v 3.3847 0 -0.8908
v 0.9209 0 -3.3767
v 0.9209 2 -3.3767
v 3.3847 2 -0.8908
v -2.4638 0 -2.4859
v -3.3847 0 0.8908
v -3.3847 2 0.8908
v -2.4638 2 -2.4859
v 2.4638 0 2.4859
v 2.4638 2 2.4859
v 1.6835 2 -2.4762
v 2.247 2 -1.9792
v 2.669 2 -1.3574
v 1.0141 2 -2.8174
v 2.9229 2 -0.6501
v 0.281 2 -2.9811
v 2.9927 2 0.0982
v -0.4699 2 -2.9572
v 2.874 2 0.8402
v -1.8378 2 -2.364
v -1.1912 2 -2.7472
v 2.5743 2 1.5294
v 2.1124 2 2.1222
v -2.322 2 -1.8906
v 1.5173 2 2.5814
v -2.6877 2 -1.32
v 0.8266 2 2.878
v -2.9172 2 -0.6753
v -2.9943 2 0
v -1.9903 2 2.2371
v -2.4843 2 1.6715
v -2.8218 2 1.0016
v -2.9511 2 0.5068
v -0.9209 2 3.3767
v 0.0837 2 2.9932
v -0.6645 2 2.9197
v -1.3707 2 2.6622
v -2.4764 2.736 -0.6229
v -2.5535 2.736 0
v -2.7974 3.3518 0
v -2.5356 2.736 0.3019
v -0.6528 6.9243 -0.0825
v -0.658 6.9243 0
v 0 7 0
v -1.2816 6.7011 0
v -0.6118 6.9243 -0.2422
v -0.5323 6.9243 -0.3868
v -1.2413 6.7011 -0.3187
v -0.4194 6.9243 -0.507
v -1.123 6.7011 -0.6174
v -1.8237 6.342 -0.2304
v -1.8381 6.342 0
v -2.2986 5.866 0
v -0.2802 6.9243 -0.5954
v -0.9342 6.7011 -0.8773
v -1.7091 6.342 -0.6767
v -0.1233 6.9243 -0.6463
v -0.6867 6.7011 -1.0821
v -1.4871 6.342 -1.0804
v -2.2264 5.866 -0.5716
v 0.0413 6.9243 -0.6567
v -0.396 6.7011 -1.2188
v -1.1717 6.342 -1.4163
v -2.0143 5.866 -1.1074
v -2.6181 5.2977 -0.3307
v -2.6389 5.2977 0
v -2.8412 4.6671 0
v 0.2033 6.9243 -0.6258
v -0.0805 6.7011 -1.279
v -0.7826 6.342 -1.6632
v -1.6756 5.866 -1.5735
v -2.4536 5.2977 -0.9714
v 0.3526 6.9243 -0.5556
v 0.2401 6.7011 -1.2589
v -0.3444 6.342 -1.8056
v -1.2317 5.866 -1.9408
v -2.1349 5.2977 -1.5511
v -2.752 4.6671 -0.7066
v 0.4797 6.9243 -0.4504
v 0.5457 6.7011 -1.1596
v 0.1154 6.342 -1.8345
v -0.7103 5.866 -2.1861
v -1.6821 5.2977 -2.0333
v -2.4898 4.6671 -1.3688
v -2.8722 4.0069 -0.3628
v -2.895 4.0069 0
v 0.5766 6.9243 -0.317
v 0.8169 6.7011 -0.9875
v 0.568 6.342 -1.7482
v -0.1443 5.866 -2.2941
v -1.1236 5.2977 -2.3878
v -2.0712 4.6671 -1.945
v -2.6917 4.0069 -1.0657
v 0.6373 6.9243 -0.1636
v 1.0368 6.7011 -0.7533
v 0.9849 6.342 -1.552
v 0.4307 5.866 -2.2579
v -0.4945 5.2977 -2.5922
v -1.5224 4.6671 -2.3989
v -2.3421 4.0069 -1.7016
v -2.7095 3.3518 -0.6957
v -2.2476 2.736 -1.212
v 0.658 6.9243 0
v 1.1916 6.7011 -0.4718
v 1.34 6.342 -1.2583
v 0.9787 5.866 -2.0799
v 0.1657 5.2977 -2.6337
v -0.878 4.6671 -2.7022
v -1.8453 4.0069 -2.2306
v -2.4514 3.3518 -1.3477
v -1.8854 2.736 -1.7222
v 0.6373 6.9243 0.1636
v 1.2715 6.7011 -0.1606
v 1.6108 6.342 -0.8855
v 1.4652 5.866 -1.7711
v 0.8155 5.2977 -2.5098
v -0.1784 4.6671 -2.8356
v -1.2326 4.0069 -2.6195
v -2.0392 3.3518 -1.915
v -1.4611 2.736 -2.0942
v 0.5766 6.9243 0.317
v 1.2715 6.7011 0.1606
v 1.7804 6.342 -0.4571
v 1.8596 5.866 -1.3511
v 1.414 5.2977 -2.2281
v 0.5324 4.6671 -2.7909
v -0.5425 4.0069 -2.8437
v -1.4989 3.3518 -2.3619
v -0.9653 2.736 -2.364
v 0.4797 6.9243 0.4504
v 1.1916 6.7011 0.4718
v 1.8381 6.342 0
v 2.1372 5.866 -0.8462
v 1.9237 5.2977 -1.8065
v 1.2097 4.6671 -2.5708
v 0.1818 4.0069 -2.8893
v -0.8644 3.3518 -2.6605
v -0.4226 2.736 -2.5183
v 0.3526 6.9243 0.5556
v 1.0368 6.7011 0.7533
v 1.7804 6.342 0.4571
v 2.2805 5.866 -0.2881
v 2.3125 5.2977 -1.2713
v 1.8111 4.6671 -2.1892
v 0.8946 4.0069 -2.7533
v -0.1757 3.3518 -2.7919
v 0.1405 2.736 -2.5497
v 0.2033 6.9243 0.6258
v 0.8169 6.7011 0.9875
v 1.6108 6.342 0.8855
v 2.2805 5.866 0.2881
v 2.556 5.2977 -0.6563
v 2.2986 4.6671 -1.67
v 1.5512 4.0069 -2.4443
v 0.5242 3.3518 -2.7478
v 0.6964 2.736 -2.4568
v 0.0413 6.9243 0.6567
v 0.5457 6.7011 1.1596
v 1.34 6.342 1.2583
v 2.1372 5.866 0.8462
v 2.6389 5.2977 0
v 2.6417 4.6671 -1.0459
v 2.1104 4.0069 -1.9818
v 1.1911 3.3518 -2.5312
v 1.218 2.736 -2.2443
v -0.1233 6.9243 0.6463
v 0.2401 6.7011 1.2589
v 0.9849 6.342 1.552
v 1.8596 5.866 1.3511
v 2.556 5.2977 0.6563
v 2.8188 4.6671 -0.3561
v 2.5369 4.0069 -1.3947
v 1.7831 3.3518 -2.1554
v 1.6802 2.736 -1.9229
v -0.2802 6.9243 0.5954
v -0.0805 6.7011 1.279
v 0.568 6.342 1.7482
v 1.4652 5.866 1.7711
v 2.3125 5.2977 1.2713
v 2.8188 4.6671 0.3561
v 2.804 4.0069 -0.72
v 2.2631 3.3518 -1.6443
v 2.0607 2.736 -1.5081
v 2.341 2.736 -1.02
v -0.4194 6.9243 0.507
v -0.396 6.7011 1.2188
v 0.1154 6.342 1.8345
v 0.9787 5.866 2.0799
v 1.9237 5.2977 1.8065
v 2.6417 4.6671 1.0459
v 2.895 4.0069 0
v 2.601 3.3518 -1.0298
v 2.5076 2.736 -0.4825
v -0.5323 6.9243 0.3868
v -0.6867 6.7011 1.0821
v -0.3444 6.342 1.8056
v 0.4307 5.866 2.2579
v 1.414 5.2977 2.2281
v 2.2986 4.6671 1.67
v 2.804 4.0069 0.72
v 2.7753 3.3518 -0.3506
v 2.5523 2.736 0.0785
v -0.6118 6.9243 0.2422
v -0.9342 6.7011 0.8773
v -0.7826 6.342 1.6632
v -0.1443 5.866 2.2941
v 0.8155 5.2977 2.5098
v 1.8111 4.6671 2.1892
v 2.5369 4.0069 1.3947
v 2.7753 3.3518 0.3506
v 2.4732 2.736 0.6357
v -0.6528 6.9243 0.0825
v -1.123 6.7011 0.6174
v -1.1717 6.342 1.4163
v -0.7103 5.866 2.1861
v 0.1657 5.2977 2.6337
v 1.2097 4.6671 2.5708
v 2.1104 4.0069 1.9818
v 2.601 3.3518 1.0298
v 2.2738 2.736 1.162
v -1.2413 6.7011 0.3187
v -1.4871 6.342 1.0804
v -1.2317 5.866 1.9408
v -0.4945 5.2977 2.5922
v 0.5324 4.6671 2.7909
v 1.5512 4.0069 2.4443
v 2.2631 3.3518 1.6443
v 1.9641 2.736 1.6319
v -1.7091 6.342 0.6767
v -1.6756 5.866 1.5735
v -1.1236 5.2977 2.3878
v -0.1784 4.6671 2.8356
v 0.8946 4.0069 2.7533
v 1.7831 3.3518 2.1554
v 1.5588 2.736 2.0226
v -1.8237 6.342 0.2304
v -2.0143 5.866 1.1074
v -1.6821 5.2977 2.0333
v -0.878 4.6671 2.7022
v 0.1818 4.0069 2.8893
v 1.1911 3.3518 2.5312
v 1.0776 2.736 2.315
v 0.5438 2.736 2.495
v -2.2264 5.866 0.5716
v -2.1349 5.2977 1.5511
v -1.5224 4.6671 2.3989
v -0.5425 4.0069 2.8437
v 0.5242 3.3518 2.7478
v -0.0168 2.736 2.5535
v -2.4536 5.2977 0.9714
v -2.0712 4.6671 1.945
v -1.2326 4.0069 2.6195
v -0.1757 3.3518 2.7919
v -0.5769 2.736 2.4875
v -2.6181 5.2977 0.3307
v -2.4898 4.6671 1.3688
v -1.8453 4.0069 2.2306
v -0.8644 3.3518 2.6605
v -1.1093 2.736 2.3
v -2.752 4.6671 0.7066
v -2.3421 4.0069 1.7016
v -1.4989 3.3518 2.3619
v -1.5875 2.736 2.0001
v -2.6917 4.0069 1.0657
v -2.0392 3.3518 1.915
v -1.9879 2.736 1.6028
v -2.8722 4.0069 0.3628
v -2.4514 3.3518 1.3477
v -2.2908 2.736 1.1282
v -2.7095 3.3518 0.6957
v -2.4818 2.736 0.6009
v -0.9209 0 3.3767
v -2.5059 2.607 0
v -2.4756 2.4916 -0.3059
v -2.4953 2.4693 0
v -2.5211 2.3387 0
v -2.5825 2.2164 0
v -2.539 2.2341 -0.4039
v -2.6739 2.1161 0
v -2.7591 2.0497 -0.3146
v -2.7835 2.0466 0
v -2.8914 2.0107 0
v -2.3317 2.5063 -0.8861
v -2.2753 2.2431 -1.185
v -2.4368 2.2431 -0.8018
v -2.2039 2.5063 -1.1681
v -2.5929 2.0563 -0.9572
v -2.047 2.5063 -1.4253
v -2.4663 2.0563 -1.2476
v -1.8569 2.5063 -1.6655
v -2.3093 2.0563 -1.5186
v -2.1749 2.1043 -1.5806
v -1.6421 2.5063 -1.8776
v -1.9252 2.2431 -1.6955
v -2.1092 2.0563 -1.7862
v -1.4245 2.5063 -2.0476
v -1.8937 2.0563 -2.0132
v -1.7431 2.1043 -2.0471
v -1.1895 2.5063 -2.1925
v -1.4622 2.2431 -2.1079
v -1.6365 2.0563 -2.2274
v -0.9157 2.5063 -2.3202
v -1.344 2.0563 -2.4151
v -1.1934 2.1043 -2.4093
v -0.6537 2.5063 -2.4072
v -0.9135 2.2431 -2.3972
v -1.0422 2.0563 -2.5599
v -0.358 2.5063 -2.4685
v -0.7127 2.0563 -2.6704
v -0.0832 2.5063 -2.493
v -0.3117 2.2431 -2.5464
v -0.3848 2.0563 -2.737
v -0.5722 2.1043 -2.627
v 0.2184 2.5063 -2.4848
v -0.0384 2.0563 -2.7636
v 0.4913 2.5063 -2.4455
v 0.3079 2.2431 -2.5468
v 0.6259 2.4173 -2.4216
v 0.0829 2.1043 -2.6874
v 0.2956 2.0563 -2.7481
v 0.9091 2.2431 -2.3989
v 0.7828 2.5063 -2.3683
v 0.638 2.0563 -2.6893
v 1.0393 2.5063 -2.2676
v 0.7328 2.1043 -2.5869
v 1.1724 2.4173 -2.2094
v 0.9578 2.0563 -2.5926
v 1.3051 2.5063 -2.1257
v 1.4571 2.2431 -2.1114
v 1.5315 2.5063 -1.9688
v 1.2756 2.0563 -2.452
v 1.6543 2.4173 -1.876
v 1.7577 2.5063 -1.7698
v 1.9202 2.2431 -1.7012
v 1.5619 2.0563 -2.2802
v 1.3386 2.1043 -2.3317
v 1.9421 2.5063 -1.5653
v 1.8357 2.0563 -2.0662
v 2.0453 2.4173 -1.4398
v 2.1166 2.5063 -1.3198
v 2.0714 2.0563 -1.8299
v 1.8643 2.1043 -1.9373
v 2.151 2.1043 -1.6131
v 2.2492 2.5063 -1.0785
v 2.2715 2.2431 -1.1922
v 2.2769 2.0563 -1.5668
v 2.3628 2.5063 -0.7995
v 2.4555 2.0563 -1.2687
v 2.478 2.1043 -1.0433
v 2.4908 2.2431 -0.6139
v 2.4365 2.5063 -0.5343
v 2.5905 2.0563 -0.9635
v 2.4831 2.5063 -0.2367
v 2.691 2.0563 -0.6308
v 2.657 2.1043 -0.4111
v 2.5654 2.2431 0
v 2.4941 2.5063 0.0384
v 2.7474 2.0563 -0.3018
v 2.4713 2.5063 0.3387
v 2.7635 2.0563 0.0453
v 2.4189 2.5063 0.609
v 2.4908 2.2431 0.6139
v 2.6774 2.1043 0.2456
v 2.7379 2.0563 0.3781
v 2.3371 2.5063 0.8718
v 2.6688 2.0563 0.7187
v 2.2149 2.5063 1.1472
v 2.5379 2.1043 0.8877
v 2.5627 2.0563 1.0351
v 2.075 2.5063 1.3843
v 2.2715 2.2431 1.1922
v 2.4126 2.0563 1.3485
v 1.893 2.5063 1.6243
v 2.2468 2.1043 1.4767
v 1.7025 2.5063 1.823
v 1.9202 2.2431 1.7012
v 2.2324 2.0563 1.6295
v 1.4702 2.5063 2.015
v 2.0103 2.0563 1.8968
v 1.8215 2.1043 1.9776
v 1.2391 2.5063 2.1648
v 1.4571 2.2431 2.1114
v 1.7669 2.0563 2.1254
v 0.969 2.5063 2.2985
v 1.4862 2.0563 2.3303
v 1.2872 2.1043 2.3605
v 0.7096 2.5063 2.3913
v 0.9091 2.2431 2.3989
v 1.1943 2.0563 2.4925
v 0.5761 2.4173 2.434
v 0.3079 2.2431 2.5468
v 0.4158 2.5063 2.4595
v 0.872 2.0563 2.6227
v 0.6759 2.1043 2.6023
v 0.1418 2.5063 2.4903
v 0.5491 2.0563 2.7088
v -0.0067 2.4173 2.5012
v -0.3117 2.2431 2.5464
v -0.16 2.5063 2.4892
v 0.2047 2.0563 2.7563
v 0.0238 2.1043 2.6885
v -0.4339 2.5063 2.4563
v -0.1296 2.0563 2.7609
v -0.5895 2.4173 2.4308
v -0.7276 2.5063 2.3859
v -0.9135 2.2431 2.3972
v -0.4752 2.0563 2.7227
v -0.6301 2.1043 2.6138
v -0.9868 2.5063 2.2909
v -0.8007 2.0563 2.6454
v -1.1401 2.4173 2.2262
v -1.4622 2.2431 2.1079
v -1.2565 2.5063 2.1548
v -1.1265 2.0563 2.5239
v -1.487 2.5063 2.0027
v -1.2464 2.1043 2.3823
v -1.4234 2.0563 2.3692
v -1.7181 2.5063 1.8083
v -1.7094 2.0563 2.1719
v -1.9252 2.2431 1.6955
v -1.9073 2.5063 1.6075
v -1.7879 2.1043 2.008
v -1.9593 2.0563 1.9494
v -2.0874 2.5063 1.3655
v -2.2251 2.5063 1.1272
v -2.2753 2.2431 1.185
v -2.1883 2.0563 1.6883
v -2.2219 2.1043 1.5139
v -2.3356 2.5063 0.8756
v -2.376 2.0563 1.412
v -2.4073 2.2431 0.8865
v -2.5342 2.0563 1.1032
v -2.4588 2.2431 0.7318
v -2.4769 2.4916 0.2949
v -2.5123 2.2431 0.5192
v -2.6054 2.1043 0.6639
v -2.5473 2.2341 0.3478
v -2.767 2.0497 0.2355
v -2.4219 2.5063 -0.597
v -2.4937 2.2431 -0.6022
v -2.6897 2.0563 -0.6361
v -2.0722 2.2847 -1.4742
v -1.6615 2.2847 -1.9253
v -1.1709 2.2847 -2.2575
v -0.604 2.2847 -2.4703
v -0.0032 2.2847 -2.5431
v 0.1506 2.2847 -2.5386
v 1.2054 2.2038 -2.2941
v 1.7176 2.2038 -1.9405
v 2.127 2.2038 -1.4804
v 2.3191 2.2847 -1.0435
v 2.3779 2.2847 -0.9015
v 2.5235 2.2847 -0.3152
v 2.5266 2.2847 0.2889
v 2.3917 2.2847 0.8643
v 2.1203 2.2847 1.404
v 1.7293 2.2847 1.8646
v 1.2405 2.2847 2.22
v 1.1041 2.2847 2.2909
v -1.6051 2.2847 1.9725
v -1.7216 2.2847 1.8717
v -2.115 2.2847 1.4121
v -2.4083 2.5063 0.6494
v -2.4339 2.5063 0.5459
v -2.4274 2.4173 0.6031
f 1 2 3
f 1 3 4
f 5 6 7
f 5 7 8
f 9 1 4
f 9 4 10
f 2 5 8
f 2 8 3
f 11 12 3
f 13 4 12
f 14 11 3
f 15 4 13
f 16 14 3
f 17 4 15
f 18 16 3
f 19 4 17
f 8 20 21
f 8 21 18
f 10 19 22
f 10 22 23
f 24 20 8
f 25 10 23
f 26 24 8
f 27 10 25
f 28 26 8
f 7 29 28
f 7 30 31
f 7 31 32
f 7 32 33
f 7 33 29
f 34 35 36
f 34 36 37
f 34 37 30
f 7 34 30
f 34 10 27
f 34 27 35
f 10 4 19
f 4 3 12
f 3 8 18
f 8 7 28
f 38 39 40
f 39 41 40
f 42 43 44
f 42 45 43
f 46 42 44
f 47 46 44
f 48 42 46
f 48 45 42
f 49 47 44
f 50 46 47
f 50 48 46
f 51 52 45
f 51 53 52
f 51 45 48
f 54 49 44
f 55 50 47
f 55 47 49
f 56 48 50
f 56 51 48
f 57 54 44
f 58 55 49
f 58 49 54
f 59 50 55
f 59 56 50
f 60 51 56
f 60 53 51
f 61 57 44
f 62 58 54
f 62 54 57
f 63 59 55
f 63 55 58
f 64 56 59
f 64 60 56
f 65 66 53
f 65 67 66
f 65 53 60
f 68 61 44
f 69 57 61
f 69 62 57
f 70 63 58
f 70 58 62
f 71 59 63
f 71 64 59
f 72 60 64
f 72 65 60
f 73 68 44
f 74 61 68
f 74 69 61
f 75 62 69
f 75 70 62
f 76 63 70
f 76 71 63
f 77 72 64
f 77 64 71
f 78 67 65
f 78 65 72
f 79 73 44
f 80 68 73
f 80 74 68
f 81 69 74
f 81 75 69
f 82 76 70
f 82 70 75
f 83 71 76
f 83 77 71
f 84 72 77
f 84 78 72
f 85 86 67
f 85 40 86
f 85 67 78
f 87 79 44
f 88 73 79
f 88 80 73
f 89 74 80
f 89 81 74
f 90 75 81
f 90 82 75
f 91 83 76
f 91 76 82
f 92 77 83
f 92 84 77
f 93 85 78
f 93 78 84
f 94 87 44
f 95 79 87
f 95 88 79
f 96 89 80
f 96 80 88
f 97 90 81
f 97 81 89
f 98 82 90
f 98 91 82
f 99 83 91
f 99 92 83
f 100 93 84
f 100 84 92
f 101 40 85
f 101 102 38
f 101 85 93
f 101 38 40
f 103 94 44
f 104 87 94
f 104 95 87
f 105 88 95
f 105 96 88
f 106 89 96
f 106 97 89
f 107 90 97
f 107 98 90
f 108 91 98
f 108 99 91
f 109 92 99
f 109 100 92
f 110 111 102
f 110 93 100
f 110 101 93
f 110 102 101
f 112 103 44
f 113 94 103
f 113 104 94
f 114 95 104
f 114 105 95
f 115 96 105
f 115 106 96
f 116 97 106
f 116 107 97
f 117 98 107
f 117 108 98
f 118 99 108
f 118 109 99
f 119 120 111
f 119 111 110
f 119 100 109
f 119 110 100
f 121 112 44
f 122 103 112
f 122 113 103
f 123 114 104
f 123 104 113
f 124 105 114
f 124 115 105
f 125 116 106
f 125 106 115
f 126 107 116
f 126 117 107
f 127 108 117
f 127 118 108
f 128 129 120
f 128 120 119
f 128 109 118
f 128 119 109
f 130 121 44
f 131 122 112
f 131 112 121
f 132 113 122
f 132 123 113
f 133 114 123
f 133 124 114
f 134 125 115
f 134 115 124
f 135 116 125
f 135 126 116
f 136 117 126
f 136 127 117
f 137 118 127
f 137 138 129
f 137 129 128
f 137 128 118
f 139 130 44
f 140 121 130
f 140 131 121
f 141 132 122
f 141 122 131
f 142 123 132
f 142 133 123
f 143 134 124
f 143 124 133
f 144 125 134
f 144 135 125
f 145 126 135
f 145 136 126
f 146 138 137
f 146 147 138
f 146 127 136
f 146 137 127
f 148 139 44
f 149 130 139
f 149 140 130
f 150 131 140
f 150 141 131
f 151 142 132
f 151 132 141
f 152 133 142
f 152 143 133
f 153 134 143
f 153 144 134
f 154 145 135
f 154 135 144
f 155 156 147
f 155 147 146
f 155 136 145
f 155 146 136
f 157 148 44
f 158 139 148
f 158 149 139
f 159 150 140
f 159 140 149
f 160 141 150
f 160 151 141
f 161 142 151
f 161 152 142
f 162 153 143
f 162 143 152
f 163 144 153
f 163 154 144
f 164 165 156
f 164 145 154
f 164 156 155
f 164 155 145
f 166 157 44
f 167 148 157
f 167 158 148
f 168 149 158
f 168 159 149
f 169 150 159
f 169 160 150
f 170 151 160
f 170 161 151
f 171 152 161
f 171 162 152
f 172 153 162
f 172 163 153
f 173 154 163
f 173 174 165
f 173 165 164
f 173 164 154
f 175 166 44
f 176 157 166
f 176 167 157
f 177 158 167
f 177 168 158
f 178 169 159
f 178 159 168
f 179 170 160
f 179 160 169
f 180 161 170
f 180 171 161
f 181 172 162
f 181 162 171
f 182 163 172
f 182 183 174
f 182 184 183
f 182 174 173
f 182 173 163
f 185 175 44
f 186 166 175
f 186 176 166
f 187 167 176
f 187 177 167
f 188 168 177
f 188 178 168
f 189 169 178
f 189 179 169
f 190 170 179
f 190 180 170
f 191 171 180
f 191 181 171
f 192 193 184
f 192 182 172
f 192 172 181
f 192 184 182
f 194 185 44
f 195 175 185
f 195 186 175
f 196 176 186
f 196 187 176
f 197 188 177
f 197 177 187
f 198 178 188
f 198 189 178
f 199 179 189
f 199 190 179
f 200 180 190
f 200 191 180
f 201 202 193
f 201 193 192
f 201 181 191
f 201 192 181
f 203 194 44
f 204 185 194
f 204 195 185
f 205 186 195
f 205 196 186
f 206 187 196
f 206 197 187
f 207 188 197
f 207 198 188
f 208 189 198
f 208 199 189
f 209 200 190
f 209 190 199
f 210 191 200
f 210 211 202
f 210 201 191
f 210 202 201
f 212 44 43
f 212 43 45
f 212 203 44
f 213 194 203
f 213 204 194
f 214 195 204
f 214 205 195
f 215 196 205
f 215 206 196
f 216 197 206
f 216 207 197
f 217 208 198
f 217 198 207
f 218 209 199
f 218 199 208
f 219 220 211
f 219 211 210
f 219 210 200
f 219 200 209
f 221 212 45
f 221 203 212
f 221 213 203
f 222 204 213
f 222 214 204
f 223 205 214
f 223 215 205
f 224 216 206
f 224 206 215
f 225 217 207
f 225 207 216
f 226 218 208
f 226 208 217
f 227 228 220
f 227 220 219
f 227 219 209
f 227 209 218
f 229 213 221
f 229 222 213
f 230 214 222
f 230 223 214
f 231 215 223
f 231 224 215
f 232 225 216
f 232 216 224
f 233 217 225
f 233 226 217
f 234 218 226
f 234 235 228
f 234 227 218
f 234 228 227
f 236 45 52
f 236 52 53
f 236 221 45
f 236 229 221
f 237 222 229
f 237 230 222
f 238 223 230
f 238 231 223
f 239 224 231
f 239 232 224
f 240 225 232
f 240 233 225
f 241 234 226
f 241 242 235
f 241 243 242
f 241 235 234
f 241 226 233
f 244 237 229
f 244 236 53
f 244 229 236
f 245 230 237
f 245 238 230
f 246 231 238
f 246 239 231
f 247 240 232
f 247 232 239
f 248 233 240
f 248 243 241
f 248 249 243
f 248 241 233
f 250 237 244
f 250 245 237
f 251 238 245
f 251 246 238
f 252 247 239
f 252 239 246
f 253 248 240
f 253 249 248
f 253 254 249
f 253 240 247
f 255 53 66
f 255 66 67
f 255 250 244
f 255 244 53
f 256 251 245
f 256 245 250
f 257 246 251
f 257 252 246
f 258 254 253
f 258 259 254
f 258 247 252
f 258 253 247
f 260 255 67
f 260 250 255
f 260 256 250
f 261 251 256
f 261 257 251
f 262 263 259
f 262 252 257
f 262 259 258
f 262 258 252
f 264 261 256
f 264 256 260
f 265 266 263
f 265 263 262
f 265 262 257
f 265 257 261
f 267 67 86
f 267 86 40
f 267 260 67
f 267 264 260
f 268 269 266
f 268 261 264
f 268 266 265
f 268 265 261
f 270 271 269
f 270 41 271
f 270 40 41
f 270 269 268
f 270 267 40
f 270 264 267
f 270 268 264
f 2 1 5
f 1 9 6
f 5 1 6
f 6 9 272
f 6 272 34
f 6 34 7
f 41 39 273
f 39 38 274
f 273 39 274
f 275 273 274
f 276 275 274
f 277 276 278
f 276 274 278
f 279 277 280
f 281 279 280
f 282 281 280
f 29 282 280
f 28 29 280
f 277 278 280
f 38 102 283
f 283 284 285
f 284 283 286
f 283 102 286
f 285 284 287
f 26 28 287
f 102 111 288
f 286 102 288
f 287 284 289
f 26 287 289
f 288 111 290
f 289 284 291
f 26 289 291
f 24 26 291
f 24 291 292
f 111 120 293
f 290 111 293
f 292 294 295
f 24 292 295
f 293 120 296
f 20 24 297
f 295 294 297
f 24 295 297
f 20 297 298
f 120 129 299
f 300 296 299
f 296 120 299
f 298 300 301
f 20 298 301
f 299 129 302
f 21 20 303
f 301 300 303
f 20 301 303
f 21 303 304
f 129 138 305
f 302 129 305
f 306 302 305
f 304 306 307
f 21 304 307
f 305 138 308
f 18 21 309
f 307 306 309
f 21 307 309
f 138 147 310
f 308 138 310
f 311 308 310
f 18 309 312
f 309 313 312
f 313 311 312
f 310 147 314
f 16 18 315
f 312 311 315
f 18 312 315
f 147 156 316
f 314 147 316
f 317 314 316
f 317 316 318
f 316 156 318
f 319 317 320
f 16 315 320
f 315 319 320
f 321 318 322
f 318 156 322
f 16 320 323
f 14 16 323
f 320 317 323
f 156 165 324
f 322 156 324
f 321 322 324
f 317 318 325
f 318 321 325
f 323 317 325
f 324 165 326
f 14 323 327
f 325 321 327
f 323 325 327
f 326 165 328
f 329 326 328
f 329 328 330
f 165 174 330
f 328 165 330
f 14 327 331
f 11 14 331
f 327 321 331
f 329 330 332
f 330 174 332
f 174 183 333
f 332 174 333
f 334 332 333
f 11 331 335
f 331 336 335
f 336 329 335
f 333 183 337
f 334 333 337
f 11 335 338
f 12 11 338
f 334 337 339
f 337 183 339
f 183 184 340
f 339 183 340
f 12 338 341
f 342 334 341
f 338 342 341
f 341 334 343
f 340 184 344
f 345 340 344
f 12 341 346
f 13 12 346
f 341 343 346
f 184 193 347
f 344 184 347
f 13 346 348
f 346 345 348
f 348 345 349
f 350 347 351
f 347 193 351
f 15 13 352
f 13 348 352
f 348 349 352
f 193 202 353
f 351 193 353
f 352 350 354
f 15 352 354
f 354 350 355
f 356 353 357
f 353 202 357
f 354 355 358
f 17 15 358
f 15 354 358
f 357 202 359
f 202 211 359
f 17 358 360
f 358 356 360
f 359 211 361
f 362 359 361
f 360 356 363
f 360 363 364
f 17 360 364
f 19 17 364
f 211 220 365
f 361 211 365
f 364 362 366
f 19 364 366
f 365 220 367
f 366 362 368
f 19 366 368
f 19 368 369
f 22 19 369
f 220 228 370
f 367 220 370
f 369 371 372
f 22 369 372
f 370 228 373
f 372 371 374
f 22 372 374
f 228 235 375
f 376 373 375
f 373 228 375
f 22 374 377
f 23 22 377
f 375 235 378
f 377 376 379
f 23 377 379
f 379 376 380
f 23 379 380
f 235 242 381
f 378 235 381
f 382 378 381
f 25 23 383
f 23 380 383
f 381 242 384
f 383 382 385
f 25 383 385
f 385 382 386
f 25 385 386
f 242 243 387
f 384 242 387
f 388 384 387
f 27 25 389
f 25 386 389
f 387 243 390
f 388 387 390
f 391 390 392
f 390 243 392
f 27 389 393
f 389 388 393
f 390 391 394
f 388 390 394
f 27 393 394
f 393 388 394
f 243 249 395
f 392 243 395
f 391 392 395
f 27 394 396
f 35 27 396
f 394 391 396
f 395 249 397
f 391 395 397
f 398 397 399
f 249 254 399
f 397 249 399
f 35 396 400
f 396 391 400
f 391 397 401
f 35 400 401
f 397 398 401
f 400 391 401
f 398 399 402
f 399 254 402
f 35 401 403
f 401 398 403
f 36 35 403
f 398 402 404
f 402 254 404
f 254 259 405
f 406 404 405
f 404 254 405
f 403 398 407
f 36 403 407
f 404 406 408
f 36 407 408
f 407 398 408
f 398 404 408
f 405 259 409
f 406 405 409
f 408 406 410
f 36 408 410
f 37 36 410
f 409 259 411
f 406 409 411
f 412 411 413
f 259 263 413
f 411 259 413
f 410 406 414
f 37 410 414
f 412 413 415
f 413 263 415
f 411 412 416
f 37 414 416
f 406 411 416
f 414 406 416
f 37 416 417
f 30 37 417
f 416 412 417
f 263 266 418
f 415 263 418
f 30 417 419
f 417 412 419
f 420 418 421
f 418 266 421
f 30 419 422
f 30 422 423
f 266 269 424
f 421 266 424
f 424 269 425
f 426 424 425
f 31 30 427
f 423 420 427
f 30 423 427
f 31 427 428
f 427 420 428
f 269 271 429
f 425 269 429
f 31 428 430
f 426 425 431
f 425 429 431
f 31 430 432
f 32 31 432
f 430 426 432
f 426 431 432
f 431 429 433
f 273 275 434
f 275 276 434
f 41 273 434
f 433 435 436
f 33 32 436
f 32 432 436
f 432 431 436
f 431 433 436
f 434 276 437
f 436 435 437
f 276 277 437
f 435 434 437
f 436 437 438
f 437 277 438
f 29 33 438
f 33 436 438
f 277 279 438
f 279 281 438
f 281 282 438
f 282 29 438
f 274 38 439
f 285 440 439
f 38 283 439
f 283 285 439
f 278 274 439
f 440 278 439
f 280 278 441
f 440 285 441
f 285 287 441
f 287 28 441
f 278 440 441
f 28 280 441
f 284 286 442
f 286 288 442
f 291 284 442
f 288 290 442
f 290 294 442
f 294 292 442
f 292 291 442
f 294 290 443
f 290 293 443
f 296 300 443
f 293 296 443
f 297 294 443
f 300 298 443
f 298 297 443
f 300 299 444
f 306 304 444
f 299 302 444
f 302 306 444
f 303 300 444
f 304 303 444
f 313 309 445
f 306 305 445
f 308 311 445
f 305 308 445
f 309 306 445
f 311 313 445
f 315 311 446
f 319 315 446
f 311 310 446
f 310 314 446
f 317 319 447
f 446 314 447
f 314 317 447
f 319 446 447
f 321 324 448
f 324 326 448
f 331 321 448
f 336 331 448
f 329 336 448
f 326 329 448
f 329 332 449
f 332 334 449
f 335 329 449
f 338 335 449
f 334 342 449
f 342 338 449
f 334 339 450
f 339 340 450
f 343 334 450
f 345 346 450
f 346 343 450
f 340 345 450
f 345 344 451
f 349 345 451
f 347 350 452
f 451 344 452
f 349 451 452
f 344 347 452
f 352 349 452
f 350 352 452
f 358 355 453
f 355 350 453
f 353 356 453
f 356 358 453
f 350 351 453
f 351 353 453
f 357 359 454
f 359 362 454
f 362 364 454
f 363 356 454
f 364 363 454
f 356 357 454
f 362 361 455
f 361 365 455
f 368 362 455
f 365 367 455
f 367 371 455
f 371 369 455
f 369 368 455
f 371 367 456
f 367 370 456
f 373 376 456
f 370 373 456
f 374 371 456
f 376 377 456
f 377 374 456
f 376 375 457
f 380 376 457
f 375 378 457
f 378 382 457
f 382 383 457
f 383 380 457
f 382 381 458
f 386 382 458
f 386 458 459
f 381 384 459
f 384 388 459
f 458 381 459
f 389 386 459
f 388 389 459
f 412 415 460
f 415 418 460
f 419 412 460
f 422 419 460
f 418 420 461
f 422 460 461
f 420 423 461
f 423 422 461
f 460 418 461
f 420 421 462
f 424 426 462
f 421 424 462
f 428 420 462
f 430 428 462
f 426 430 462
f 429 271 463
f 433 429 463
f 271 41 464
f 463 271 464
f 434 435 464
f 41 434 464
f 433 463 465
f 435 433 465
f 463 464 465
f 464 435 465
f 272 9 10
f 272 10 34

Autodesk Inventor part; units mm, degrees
ref_plane "YZ Plane" through (0, 0, 0) normal (1, 0, 0) x (0, 1, 0)
ref_plane "XZ Plane" through (0, 0, 0) normal (0, 1, 0) x (-1, 0, 0)
ref_plane "XY Plane" through (0, 0, 0) normal (0, 0, 1) x (1, 0, 0)
sketch "Sketch1" plane through (0, 0, 0) normal (0, 0, 1) x (1, 0, 0)
  line L0 (0, 0) -> (0, 7)
  line L1 (0, 0.1034) -> (0, 4.1034)
  arc A0 (0, 7) -> (0, 1.2068) centre (0, 4.1034) ccw
  dimension "d0" = 7
  dimension "d1" = 4
revolve "Revolution1" add sketch "Sketch1" angle 360 about axis through (0, 0.1034, 0) along (0, 1, 0)
sketch "Sketch2" plane through (0, 0, 0) normal (0, 1, 0) x (-1, 0, 0)
  circle A0 centre (0, 0) radius 3.5
  line L0 (0.9209, 3.3767) -> (3.3847, 0.8908)
  line L1 (3.3847, 0.8908) -> (2.4638, -2.4859)
  line L2 (2.4638, -2.4859) -> (-0.9209, -3.3767)
  line L3 (-0.9209, -3.3767) -> (-3.3847, -0.8908)
  line L4 (-3.3847, -0.8908) -> (-2.4638, 2.4859)
  line L5 (-2.4638, 2.4859) -> (0.9209, 3.3767)
  dimension "d3" = 7
extrude "Extrusion1" add sketch "Sketch2" along normal blind 2 contours L1 L2 L3 L4 L5 L0
fillet "Fillet1" radius 0.5 1 edges at (1.9914, 2, 0)
properties part number "5"
